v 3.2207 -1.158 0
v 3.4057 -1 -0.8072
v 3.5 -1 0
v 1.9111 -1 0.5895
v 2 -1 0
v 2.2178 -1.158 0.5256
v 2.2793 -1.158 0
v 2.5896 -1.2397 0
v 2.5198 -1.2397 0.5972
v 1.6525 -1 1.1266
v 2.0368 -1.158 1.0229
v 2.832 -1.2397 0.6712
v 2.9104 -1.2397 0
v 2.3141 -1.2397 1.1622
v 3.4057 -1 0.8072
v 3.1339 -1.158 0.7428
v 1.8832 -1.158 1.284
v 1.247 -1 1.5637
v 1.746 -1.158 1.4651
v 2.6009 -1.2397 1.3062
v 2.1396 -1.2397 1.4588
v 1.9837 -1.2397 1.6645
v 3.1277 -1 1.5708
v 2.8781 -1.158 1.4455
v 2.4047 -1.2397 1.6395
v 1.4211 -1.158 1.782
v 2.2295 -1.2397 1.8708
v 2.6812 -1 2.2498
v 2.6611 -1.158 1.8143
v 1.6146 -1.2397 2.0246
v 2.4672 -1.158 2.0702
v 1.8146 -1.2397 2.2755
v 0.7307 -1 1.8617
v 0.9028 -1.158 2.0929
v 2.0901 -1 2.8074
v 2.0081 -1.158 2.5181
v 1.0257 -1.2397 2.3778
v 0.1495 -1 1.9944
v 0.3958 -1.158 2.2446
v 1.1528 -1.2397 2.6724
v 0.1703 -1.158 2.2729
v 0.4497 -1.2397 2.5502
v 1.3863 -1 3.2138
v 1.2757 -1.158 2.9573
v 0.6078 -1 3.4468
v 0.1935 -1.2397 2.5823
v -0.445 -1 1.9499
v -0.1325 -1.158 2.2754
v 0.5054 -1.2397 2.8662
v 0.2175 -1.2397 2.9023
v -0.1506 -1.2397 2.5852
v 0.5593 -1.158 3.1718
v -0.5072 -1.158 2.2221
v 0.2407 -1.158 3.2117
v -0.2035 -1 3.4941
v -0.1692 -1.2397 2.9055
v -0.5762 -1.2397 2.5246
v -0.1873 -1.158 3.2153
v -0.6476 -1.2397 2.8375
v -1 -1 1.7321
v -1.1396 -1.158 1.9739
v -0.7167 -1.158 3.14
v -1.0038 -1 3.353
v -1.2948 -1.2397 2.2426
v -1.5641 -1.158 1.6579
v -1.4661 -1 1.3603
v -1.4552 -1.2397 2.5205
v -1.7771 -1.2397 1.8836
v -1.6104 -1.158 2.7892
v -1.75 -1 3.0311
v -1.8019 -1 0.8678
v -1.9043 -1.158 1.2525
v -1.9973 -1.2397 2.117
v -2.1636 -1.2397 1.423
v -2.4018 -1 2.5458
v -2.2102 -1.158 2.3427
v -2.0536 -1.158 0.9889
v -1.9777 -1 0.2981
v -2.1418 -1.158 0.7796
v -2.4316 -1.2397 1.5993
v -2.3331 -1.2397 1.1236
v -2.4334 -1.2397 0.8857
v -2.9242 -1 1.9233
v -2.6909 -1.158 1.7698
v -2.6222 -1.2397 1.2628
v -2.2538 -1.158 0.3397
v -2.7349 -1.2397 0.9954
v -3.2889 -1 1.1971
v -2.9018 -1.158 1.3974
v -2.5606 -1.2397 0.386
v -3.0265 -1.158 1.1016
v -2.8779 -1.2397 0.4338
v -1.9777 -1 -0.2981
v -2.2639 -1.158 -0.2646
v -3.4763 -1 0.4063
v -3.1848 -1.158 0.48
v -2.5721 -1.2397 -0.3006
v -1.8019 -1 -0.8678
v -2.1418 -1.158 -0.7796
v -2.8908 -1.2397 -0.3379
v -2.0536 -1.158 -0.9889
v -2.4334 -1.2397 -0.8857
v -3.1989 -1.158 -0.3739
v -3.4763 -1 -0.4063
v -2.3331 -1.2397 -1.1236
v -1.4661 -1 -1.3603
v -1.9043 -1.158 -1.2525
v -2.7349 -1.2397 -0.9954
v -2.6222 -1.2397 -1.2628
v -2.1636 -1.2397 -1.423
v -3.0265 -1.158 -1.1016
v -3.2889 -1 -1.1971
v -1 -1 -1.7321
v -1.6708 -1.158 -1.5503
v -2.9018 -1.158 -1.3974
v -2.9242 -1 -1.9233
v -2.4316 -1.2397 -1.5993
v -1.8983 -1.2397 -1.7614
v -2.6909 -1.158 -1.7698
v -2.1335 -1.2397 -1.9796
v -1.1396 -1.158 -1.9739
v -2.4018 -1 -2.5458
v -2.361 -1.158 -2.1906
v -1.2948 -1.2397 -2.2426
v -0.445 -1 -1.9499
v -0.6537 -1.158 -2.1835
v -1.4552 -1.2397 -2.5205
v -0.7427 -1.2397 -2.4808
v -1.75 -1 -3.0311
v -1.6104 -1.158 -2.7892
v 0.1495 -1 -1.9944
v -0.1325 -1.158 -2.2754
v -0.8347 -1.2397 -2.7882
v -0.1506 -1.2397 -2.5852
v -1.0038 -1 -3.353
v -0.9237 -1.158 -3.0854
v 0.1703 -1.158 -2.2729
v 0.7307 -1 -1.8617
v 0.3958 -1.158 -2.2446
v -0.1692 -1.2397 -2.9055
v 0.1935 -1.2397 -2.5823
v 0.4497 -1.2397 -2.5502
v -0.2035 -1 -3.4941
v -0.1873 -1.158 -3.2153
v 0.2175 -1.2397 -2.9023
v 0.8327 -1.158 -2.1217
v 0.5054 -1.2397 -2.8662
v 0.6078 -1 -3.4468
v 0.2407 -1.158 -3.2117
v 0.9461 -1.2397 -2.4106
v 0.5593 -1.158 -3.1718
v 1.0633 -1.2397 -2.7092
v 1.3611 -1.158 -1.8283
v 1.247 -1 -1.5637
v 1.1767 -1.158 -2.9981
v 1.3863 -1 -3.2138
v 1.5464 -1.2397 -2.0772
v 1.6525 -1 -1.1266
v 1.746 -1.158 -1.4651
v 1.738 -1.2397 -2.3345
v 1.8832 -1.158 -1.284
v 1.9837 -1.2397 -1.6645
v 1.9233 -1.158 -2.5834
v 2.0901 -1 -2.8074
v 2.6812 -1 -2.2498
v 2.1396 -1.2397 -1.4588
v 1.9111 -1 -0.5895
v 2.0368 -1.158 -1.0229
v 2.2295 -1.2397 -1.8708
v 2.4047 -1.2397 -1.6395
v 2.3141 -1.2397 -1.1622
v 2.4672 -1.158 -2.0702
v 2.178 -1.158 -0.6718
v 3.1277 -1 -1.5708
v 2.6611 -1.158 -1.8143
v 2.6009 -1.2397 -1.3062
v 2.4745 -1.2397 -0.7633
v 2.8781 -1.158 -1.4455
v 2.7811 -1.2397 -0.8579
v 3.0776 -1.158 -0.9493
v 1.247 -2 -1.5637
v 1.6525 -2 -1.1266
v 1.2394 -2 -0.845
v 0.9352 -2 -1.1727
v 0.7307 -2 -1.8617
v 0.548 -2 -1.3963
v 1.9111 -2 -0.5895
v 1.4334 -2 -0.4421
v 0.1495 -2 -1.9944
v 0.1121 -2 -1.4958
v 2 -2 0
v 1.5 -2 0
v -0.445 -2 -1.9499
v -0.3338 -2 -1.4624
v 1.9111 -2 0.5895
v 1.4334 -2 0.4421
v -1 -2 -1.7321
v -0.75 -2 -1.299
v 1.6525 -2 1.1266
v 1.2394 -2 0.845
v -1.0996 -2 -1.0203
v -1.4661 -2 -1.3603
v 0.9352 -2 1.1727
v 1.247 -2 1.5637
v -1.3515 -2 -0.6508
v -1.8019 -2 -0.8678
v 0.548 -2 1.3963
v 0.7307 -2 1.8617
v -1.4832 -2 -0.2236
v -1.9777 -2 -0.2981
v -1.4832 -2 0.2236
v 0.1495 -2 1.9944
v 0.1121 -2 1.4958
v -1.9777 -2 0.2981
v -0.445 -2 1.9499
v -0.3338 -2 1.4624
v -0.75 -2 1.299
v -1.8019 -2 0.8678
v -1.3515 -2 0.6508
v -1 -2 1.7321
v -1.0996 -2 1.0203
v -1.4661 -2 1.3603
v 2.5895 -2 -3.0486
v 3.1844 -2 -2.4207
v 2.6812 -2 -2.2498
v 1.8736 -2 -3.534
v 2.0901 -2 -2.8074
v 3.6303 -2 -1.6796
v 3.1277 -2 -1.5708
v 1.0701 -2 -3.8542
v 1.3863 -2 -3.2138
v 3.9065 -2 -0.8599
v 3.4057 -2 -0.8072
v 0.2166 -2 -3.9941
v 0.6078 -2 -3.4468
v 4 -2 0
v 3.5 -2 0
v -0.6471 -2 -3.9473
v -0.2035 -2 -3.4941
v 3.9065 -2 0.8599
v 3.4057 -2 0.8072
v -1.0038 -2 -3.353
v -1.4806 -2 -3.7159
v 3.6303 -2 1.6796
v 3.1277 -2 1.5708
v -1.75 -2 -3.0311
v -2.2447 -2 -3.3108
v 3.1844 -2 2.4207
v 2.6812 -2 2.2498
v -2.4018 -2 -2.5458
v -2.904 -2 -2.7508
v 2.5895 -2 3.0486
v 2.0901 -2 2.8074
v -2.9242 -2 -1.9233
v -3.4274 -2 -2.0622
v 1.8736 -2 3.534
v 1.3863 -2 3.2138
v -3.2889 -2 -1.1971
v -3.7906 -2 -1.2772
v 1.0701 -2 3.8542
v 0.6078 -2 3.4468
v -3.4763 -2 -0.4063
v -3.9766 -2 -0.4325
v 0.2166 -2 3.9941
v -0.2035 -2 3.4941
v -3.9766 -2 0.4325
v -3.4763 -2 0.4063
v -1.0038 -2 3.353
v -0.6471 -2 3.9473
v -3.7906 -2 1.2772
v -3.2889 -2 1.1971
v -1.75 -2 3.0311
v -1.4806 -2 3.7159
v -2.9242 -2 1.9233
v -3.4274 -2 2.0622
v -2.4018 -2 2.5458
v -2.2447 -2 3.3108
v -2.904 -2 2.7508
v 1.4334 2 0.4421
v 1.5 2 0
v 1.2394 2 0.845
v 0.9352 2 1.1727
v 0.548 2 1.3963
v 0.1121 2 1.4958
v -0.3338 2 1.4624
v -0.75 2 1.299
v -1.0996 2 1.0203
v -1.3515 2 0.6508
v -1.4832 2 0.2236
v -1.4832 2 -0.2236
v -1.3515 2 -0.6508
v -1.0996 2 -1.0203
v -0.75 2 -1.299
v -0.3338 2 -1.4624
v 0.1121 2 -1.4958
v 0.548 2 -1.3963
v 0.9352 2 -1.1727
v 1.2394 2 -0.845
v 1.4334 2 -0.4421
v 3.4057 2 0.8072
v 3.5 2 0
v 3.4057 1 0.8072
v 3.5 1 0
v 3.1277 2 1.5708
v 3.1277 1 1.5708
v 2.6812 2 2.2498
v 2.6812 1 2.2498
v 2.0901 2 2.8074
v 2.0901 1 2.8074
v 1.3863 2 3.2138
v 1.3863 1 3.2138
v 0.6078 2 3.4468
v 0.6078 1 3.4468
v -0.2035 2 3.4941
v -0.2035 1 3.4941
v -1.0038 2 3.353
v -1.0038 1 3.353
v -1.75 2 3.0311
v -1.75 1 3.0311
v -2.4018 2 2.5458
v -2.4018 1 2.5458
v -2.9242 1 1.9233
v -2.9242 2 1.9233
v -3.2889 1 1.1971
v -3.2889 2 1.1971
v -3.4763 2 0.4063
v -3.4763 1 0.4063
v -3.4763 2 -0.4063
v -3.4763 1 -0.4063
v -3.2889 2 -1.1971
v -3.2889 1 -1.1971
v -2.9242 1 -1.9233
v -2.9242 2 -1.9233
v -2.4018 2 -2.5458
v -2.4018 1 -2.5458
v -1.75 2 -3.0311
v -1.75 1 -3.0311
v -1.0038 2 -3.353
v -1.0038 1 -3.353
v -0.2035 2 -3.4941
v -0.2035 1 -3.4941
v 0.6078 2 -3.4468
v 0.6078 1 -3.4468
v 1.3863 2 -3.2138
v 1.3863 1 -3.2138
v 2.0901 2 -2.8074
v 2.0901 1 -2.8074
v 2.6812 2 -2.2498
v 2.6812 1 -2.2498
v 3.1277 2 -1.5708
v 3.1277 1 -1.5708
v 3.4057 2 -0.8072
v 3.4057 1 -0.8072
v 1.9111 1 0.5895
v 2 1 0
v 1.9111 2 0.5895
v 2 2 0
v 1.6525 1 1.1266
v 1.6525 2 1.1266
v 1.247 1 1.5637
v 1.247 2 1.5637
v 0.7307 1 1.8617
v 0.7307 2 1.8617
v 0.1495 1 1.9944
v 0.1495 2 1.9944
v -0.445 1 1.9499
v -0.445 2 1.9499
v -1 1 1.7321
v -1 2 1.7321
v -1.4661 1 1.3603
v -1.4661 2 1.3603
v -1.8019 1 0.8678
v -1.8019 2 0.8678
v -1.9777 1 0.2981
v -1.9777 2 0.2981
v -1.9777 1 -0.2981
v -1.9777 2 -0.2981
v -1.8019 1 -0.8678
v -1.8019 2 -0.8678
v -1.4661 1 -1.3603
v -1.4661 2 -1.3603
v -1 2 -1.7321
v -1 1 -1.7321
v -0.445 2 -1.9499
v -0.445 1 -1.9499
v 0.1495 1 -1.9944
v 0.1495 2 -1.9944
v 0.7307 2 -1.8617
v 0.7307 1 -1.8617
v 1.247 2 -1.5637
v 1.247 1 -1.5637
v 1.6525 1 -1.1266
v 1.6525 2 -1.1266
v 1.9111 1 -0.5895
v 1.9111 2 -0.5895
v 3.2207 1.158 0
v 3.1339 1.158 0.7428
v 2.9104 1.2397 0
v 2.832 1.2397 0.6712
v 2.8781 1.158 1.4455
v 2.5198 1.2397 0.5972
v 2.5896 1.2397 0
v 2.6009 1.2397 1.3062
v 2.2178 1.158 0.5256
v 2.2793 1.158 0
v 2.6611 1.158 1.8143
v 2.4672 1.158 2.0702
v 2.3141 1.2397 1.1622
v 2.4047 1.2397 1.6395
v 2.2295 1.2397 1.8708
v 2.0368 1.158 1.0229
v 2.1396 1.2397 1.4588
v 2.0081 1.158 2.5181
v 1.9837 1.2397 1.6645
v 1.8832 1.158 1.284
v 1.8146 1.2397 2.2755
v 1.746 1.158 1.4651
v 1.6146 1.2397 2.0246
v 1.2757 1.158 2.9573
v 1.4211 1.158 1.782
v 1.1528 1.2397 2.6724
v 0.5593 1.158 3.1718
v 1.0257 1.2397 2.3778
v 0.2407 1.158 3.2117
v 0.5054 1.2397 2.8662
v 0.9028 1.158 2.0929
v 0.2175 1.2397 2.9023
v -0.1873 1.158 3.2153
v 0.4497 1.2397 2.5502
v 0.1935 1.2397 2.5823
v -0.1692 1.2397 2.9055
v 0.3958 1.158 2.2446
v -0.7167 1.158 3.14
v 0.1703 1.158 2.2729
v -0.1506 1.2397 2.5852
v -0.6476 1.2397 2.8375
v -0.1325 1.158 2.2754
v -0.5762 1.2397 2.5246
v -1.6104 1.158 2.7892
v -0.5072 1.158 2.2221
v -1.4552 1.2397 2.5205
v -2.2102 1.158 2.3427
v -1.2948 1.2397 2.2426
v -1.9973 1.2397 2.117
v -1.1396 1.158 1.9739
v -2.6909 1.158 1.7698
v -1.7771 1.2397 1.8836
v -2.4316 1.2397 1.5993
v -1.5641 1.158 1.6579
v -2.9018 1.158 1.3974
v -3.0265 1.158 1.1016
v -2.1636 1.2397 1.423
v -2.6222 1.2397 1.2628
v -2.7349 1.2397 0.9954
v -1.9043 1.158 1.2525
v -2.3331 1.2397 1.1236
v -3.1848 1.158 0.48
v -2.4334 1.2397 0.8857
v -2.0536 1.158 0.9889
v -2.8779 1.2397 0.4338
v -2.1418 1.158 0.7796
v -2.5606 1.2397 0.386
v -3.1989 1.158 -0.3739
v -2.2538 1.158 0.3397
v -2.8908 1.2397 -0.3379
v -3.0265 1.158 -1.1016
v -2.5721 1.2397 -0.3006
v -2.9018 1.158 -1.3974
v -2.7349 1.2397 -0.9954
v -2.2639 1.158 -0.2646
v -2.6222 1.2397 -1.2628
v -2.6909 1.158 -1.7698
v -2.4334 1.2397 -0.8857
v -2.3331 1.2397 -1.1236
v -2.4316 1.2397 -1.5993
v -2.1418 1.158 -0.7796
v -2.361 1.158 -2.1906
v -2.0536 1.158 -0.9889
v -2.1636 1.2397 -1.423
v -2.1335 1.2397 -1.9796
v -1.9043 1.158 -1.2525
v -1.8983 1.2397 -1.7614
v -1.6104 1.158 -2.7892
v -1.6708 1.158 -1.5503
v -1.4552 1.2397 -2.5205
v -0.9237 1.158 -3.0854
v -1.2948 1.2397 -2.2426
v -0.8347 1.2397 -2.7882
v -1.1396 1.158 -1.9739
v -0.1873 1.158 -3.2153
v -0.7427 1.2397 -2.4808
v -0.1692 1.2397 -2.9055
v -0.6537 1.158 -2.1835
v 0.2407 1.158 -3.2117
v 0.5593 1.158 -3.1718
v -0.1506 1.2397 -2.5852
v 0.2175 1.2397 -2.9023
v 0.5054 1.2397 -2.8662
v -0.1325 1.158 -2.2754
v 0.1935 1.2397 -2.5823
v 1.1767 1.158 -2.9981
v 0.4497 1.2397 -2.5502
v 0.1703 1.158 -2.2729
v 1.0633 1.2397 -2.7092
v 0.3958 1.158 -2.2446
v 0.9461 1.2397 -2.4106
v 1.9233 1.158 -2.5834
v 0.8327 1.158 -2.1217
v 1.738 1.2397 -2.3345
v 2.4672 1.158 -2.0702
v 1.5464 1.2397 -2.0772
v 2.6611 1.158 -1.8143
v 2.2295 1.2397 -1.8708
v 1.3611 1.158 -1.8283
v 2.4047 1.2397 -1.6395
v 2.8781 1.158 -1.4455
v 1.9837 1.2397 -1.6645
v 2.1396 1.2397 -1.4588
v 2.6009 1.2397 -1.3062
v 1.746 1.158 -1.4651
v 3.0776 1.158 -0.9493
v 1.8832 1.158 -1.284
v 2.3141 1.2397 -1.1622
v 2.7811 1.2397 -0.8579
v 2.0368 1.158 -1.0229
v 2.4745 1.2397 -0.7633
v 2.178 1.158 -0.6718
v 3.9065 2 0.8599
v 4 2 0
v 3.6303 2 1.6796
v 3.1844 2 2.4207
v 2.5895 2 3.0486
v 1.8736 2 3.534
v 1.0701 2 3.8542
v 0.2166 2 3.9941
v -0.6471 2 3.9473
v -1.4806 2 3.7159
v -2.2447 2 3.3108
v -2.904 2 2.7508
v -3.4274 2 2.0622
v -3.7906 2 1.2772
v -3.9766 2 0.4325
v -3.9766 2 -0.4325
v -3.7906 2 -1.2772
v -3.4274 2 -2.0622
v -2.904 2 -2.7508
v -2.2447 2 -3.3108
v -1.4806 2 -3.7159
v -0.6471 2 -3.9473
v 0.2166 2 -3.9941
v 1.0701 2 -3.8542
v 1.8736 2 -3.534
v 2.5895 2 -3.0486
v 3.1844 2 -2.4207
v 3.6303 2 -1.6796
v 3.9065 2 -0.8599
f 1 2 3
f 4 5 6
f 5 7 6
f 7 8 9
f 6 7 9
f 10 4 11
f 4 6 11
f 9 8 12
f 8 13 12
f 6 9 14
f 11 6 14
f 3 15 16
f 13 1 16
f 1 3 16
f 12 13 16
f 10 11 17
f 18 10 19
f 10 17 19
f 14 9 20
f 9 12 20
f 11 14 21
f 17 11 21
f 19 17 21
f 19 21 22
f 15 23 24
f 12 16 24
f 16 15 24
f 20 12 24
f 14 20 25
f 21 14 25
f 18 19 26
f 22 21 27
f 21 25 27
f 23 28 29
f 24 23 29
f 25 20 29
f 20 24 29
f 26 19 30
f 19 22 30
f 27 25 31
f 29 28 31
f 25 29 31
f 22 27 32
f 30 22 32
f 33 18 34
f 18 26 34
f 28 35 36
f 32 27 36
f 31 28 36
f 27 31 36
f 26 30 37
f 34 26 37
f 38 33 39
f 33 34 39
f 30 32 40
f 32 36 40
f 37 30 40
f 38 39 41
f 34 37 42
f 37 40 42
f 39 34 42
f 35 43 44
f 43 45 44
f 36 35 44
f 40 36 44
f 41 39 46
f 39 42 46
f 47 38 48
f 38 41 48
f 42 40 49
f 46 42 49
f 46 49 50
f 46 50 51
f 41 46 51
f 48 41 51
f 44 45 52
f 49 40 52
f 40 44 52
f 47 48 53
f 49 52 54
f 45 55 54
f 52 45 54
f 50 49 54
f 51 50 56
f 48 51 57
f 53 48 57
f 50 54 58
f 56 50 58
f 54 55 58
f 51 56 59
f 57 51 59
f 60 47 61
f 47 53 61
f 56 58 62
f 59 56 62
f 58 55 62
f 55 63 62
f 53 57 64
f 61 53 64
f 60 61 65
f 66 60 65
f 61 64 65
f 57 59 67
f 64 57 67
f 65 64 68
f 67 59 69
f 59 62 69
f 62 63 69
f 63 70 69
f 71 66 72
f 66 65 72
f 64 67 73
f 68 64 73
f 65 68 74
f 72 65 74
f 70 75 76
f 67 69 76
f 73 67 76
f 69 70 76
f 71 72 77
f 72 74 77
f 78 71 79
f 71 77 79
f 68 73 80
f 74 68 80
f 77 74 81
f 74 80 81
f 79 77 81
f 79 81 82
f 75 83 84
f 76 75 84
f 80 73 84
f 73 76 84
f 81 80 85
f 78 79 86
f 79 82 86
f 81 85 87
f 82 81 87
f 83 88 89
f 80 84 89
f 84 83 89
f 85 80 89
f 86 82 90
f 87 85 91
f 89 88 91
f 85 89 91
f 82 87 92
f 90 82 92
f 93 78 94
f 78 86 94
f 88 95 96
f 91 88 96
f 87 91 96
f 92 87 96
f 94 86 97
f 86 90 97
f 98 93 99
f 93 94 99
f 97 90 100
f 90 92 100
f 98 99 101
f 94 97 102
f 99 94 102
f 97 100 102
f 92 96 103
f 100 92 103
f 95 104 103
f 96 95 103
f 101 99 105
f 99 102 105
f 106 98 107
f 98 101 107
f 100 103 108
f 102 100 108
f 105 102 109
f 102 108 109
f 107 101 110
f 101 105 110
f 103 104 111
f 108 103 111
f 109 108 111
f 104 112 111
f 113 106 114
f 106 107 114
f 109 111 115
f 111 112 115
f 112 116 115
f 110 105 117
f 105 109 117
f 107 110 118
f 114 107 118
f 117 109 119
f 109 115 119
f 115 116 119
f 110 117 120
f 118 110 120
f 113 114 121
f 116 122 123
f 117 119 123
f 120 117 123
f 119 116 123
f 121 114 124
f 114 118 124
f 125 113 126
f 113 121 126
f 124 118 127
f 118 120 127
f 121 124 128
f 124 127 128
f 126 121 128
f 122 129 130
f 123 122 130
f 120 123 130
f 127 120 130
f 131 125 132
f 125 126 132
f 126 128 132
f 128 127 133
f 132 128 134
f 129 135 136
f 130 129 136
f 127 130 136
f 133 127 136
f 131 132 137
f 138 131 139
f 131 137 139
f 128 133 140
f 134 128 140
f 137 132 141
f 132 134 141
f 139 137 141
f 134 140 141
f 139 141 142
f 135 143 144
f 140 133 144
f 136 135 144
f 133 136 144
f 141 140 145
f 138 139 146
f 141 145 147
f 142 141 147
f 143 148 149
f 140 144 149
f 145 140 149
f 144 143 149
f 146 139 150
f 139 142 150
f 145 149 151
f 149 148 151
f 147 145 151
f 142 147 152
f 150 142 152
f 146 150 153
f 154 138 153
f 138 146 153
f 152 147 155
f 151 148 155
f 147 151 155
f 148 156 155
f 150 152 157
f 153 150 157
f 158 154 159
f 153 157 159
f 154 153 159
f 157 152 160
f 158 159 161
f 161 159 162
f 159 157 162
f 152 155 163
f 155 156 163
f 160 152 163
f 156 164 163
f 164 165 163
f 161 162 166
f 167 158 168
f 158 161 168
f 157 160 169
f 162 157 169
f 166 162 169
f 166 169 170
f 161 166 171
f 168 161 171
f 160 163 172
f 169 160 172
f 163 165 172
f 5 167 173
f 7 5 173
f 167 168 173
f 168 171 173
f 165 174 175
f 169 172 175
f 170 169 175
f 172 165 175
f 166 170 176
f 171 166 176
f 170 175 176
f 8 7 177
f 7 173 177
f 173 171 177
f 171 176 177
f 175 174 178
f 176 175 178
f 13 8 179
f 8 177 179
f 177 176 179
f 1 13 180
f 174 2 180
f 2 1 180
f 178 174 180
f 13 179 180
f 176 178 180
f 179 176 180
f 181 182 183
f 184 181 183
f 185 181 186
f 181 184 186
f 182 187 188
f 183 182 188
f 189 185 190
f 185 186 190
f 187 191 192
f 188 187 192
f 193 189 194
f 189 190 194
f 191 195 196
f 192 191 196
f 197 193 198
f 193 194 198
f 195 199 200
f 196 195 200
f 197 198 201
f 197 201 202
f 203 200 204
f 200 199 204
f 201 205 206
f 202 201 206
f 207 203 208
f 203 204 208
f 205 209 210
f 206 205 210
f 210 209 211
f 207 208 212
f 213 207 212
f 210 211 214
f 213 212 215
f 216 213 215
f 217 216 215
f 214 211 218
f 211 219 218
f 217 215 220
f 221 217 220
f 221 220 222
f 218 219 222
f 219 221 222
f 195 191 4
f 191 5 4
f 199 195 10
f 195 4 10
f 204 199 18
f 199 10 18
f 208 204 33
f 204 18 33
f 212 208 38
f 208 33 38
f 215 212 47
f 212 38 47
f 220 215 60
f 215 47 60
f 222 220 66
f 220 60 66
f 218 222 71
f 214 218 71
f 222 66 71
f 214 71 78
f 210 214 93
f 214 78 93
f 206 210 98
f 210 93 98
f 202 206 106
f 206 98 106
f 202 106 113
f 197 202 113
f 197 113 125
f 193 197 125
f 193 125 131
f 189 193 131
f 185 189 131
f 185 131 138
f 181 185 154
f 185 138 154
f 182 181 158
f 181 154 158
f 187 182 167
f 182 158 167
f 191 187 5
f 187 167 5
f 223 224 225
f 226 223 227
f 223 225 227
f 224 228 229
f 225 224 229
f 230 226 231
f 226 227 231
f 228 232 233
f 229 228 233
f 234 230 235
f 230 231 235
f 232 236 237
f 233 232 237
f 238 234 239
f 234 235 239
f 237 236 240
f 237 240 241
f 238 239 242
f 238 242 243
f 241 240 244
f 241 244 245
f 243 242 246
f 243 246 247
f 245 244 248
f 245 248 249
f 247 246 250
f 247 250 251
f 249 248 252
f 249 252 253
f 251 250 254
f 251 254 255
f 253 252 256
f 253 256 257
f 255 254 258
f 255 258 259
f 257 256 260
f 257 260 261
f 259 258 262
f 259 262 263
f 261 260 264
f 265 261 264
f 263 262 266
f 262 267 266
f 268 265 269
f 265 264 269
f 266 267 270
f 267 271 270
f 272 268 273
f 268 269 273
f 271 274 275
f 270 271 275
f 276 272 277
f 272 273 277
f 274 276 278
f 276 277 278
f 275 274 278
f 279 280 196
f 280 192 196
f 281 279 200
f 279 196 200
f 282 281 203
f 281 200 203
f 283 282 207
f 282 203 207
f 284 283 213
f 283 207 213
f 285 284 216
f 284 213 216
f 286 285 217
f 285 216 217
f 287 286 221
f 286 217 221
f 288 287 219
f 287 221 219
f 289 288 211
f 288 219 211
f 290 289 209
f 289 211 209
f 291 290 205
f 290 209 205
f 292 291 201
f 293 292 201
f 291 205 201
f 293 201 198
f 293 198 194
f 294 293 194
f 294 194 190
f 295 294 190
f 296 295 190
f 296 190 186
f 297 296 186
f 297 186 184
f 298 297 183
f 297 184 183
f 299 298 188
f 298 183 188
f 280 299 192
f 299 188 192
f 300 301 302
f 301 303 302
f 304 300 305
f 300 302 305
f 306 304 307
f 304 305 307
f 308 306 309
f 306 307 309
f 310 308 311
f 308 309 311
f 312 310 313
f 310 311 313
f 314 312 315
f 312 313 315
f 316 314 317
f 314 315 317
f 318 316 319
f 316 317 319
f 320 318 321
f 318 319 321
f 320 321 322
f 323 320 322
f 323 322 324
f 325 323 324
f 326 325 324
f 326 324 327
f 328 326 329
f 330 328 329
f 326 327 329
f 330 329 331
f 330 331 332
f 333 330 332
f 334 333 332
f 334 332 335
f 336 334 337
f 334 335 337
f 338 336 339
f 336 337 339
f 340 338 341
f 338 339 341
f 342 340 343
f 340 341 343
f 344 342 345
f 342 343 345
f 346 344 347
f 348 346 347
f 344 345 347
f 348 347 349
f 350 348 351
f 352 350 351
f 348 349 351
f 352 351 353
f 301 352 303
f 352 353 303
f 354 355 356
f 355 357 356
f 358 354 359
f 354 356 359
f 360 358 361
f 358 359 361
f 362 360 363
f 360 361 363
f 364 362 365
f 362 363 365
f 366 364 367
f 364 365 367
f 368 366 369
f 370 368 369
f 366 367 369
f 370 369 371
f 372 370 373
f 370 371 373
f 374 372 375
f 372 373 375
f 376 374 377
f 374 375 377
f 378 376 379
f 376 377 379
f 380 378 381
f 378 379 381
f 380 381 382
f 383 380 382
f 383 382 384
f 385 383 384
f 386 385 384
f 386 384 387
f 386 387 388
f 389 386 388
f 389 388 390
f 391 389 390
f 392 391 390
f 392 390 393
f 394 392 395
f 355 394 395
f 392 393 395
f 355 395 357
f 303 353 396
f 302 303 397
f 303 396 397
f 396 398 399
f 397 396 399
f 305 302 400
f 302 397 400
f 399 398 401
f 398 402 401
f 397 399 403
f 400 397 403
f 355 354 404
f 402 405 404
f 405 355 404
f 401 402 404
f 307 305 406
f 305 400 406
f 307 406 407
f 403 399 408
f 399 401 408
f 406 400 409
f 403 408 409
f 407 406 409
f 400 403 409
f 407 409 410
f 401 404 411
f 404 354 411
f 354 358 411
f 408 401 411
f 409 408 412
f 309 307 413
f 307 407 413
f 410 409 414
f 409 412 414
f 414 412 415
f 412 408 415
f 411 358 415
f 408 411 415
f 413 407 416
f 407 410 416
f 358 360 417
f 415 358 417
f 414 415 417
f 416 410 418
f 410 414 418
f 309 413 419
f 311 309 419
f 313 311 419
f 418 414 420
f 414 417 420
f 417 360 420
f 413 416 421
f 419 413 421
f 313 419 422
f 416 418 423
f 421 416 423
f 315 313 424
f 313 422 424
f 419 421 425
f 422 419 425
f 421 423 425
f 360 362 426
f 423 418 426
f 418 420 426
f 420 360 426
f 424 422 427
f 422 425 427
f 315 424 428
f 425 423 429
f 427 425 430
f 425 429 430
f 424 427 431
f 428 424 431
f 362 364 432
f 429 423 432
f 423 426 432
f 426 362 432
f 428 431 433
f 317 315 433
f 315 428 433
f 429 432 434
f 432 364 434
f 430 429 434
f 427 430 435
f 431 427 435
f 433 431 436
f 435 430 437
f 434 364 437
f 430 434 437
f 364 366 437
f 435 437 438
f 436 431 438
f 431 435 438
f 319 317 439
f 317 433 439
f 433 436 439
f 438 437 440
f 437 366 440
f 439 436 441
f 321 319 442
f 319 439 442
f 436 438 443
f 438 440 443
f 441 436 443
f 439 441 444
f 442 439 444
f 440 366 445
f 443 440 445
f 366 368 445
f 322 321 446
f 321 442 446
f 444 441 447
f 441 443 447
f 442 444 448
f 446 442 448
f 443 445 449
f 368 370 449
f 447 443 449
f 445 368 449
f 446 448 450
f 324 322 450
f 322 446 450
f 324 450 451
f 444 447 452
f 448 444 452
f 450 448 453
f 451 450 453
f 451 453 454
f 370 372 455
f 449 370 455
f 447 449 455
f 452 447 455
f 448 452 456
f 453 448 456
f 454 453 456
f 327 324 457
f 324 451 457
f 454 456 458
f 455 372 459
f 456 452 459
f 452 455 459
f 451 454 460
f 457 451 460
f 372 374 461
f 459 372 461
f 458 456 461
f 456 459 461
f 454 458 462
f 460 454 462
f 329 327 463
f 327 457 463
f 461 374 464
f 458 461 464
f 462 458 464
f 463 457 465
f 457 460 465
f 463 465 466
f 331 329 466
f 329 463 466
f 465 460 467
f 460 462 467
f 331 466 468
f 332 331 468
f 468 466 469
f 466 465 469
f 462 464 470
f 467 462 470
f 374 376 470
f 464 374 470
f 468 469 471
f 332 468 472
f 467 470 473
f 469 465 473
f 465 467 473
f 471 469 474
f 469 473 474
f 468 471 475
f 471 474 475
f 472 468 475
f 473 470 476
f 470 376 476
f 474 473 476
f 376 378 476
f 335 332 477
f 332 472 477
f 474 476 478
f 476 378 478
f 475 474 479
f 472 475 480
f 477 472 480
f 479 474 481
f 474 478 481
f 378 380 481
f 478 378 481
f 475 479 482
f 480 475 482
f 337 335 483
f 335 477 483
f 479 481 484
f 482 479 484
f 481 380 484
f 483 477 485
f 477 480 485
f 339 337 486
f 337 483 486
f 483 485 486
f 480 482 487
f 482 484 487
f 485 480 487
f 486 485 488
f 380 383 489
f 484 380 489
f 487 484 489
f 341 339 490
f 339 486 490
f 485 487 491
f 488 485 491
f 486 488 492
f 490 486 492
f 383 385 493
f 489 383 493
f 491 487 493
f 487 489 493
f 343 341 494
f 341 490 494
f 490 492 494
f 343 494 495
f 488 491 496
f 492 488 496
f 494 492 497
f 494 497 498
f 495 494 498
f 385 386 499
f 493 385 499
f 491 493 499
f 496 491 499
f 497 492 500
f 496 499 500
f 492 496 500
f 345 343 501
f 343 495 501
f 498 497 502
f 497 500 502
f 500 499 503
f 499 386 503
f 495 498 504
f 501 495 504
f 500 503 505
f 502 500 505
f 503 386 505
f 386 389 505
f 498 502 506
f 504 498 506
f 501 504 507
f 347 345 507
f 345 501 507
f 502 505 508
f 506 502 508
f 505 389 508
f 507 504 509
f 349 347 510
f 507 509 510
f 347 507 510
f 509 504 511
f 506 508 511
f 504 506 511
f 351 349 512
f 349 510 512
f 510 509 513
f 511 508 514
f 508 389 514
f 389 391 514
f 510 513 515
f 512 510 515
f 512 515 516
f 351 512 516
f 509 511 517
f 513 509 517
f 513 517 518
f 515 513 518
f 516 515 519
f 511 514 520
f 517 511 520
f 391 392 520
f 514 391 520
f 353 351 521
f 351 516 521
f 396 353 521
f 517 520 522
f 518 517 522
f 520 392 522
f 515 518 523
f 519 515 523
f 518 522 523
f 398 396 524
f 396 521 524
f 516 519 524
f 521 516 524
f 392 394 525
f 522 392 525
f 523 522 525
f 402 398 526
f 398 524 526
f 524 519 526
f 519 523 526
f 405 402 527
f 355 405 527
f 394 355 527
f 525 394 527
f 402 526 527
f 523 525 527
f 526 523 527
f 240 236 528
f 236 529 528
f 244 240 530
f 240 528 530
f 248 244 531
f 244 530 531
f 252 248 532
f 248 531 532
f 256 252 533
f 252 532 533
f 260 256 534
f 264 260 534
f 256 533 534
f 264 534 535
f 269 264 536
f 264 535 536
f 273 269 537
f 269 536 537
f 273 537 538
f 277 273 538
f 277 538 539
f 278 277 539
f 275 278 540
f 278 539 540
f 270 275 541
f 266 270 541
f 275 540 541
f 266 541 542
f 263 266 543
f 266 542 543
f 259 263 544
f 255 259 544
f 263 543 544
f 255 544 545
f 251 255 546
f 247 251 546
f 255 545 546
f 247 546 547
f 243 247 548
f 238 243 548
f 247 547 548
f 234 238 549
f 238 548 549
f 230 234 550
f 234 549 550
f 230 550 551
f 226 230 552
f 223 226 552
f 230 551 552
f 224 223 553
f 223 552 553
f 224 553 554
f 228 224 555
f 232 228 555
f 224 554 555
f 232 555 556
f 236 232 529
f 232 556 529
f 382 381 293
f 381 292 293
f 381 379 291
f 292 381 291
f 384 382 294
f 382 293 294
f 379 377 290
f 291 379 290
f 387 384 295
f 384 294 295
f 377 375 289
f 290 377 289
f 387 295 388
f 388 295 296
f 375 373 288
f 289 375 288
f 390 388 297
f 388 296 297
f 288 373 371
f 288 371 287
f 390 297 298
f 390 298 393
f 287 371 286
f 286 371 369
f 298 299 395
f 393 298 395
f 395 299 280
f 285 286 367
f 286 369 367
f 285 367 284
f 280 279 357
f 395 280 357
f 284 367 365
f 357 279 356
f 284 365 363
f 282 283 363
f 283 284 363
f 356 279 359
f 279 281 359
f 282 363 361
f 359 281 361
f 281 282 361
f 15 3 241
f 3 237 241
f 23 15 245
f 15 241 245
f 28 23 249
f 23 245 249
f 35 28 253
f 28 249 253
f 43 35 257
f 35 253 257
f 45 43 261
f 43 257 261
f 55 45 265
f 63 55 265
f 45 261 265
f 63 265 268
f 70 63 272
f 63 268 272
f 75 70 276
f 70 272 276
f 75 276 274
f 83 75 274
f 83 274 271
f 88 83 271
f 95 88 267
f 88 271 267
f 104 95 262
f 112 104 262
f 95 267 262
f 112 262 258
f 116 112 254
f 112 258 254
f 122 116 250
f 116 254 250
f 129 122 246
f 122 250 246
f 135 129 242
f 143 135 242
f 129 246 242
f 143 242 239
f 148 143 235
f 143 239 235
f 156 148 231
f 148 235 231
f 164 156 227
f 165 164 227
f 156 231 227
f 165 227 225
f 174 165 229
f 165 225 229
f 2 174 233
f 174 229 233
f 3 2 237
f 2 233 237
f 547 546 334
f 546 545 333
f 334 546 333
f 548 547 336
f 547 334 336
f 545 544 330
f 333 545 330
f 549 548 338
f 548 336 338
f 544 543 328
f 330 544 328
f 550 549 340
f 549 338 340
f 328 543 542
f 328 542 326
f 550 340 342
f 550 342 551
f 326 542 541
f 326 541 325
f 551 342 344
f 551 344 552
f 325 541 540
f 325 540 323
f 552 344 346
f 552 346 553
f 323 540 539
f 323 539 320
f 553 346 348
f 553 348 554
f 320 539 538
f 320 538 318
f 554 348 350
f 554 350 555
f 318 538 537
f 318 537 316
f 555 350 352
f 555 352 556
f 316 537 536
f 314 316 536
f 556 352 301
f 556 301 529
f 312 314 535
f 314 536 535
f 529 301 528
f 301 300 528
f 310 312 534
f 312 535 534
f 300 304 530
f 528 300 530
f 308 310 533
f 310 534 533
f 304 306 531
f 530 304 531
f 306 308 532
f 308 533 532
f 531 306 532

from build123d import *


with BuildPart() as part:
    # Sketch1 → Revolve1 (revolve)
    with BuildSketch(Plane.XY):
        with BuildLine():
            Line((1.5, 2), (1.5, -2))
            Line((1.5, -2), (2, -2))
            Line((2, -2), (2, -1))
            ThreePointArc((2, -1), (2.75, -1.25), (3.5, -1))
            Line((3.5, -1), (3.5, -2))
            Line((3.5, -2), (4, -2))
            Line((4, -2), (4, 2))
            Line((4, 2), (3.5, 2))
            Line((3.5, 2), (3.5, 1))
            ThreePointArc((3.5, 1), (2.75, 1.25), (2, 1))
            Line((2, 1), (2, 2))
            Line((2, 2), (1.5, 2))
        make_face()
    revolve(axis=Axis((0, 1.338212484, 0), (0, -1, 0)))


solid = part.part
